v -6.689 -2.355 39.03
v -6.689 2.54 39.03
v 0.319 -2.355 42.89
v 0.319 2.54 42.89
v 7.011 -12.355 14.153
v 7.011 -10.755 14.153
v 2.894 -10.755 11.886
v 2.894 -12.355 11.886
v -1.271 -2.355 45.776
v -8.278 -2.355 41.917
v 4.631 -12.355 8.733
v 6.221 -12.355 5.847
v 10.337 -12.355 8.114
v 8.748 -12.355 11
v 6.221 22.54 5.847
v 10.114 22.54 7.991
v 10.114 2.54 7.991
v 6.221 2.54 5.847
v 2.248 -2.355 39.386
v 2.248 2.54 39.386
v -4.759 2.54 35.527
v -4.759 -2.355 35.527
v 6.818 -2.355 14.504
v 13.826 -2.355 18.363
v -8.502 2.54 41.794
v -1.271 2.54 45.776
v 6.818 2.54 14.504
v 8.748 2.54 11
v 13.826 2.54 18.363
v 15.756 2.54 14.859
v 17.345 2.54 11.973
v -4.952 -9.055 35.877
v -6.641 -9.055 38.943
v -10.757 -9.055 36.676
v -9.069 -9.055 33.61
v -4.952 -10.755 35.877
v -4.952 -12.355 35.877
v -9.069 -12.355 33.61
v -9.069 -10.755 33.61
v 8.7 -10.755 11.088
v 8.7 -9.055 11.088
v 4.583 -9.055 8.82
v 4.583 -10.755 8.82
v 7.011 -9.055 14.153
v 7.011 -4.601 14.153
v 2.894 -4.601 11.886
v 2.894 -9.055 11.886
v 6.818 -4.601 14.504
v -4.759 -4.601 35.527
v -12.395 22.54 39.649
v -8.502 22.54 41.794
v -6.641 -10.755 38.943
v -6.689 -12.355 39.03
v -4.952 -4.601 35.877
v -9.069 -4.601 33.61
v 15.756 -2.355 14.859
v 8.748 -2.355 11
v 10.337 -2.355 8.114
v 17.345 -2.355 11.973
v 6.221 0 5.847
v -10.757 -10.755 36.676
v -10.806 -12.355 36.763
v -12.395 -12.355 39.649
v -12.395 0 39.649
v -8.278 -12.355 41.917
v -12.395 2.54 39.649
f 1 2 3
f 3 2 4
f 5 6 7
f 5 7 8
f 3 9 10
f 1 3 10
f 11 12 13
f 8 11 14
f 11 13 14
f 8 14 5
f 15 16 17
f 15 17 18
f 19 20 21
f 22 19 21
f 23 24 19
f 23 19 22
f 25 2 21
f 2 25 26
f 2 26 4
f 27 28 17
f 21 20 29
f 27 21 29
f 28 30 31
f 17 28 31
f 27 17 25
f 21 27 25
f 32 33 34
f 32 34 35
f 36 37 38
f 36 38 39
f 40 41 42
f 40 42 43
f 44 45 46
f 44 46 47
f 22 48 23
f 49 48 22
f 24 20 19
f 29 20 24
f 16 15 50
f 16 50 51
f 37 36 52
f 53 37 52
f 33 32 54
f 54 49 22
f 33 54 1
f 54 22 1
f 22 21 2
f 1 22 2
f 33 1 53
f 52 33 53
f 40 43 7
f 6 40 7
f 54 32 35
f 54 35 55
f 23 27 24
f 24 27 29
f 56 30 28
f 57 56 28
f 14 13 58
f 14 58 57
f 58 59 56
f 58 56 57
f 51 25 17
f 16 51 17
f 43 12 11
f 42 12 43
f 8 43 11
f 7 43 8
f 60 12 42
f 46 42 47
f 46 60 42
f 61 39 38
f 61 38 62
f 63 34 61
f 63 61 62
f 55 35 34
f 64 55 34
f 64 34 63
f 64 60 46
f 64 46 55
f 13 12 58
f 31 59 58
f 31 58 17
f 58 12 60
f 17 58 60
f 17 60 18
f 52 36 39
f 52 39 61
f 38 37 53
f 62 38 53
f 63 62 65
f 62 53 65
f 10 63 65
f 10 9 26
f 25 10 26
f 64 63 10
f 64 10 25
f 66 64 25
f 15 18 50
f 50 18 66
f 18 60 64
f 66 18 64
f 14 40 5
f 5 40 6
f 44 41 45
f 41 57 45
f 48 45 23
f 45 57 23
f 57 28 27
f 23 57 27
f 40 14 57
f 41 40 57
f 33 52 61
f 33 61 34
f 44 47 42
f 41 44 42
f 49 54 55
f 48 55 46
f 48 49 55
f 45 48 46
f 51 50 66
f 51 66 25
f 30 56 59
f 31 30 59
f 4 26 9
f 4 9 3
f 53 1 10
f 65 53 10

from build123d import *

# Parameters (mm, degrees)
SKETCH1_R           = 1.9431
BOSS_EXTRUDE1_DEPTH = 2.54
SKETCH2_W           = 38.589880166
SKETCH2_H           = 14.895146316
BOSS_EXTRUDE2_DEPTH = 12.7
CUT_EXTRUDE1_REACH  = 53.659
CUT_EXTRUDE2_DEPTH  = 10
BOSS_EXTRUDE3_DEPTH = 4.7
CUT_EXTRUDE3_DEPTH  = 4.7
CUT_EXTRUDE6_DEPTH  = 51.984917616
BOSS_EXTRUDE4_DEPTH = 20


with BuildPart() as part:
    # Sketch1 → Boss-Extrude1 (new body)
    with BuildSketch(Plane(origin=(0, 0, 0), x_dir=(1, 0, 0), z_dir=(0, 1, 0))):
        with BuildLine():
            Line((-18.7452, 4.565139349), (-2.394218959, 4.565139349))
            ThreePointArc((-2.394218959, 4.565139349), (0.884862389, -0.223028162), (6.223, -2.499694465))
            Line((6.223, -2.499694465), (6.223, -5.842))
            Line((6.223, -5.842), (-12.3952, -39.6494))
            Line((-12.3952, -39.6494), (-18.7452, -39.6494))
            Line((-18.7452, -39.6494), (-18.7452, -5.842))
            Line((-18.7452, -5.842), (-18.7452, 4.565139349))
        make_face()
        with Locations(Location((-15.9512, -28.3464, 0), (0, 0, 270))):
            Circle(SKETCH1_R, mode=Mode.SUBTRACT)
        with Locations(Location((-15.9512, -2.0574, 0), (0, 0, 270))):
            Circle(SKETCH1_R, mode=Mode.SUBTRACT)
    extrude(amount=BOSS_EXTRUDE1_DEPTH)

    # Sketch2 → Boss-Extrude2 (add)
    with BuildSketch(Plane(origin=(7.243438798, 0, 3.989061337), x_dir=(0.48239868494869226, 0, -0.8759517730787308), z_dir=(0.875951773078731, 0, 0.4823986849486923))):
        with Locations((-21.415450328, -4.907573158)):
            Rectangle(SKETCH2_W, SKETCH2_H)
    extrude(amount=BOSS_EXTRUDE2_DEPTH)

    # Cut-Extrude1: up to this face of the body (flat: up to its plane)
    cut_extrude1_end = Plane(part.part.faces().sort_by_distance((2.474947481, -12.355146316, 25.811194672))[0])
    # Sketch3 → Cut-Extrude1 (cut, up to the picked face)
    with BuildSketch(Plane(origin=(0, 2.54, 0), x_dir=(1, 0, 0), z_dir=(0, 1, 0)), mode=Mode.PRIVATE) as cut_extrude1_sk1:
        Polygon((0.318862281, -42.889654691), (2.248457021, -39.385847599), (-8.876130497, -33.2593843), (-10.805725237, -36.763191392), align=None)
    cut_extrude1_tool1 = split(extrude(cut_extrude1_sk1.sketch, amount=-CUT_EXTRUDE1_REACH, mode=Mode.PRIVATE), bisect_by=cut_extrude1_end, keep=Keep.BOTH, mode=Mode.PRIVATE)
    # Sketch3 → Cut-Extrude1 (cut, up to the picked face)
    with BuildSketch(Plane(origin=(0, 2.54, 0), x_dir=(1, 0, 0), z_dir=(0, 1, 0)), mode=Mode.PRIVATE) as cut_extrude1_sk2:
        Polygon((13.82602546, -18.363005045), (15.7556202, -14.859197952), (4.631032681, -8.732734653), (2.701437942, -12.236541746), align=None)
    cut_extrude1_tool2 = split(extrude(cut_extrude1_sk2.sketch, amount=-CUT_EXTRUDE1_REACH, mode=Mode.PRIVATE), bisect_by=cut_extrude1_end, keep=Keep.BOTH, mode=Mode.PRIVATE)
    add(cut_extrude1_tool1.solids().sort_by(Axis((-4.278634, 2.54, 38.074519), (0, -1, 0)))[0], mode=Mode.SUBTRACT)
    add(cut_extrude1_tool2.solids().sort_by(Axis((9.228529, 2.54, 13.54787), (0, -1, 0)))[0], mode=Mode.SUBTRACT)

    # Sketch5 → Cut-Extrude2 (cut)
    with BuildSketch(Plane.XZ.offset(12.355146316)):
        Polygon((-1.270612482, 45.775863299), (17.345094963, 11.972989344), (10.337480778, 8.113799865), (-8.278226667, 41.916673819), align=None)
    extrude(amount=-CUT_EXTRUDE2_DEPTH, mode=Mode.SUBTRACT)

    # Sketch6 → Boss-Extrude3 (add)
    with BuildSketch(Plane(origin=(11.360412132, 0, 6.256335156), x_dir=(0.4823986849486924, 0, -0.8759517730787308), z_dir=(0.8759517730787307, 0, 0.48239868494869237))):
        Polygon((-33.415450328, -2.355146316), (-33.415450328, -12.355146316), (-37.415450328, -12.355146316), (-37.415450328, -2.355146316), (-37.415450328, 2.54), (-33.415450328, 2.54), align=None)
        Polygon((-9.415450328, -12.355146316), (-9.415450328, -2.355146316), (-9.415450328, 2.54), (-5.415450328, 2.54), (-5.415450328, -2.355146316), (-5.415450328, -12.355146316), align=None)
    extrude(amount=-BOSS_EXTRUDE3_DEPTH)

    # Sketch7 → Cut-Extrude3 (cut)
    with BuildSketch(Plane(origin=(11.360412132, 0, 6.256335156), x_dir=(0.4823986849486924, 0, -0.8759517730787308), z_dir=(0.8759517730787307, 0, 0.48239868494869237))):
        Polygon((-21.415450328, -12.355146316), (-33.815450328, -12.355146316), (-33.815450328, -10.755146316), (-37.315450328, -10.755146316), (-37.315450328, -9.055146316), (-33.815450328, -9.055146316), (-33.815450328, -4.601295169), (-9.015450328, -4.601295169), (-9.015450328, -9.055146316), (-5.515450328, -9.055146316), (-5.515450328, -10.755146316), (-9.015450328, -10.755146316), (-9.015450328, -12.355146316), align=None)
    extrude(amount=-CUT_EXTRUDE3_DEPTH, mode=Mode.SUBTRACT)

    # Sketch8 → Cut-Extrude6 (cut, through all)
    with BuildSketch(Plane.XZ):
        with BuildLine():
            Line((-18.7452, 39.6494), (-18.7452, -4.565139349))
            Line((-18.7452, -4.565139349), (-2.394218959, -4.565139349))
            ThreePointArc((-2.394218959, -4.565139349), (0.884862389, 0.223028162), (6.223, 2.499694465))
            Line((6.223, 2.499694465), (6.417585038, 2.467761903))
            Line((6.417585038, 2.467761903), (6.417585038, 5.846526045))
            Line((6.417585038, 5.846526045), (6.220507445, 5.846526045))
            Line((6.220507445, 5.846526045), (-12.3952, 39.6494))
            Line((-12.3952, 39.6494), (-12.3952, 39.814053402))
            Line((-12.3952, 39.814053402), (-18.7452, 39.848024464))
            Line((-18.7452, 39.848024464), (-18.7452, 39.6494))
        make_face()
    extrude(amount=-CUT_EXTRUDE6_DEPTH, mode=Mode.SUBTRACT)

    # Sketch11 → Boss-Extrude4 (add)
    with BuildSketch(Plane(origin=(0, 2.54, 0), x_dir=(1, 0, 0), z_dir=(0, 1, 0))):
        Polygon((6.220507445, -5.846526045), (-12.3952, -39.6494), (-8.50168256, -41.793613586), (10.114024885, -7.990739632), align=None)
    extrude(amount=BOSS_EXTRUDE4_DEPTH)


solid = part.part
